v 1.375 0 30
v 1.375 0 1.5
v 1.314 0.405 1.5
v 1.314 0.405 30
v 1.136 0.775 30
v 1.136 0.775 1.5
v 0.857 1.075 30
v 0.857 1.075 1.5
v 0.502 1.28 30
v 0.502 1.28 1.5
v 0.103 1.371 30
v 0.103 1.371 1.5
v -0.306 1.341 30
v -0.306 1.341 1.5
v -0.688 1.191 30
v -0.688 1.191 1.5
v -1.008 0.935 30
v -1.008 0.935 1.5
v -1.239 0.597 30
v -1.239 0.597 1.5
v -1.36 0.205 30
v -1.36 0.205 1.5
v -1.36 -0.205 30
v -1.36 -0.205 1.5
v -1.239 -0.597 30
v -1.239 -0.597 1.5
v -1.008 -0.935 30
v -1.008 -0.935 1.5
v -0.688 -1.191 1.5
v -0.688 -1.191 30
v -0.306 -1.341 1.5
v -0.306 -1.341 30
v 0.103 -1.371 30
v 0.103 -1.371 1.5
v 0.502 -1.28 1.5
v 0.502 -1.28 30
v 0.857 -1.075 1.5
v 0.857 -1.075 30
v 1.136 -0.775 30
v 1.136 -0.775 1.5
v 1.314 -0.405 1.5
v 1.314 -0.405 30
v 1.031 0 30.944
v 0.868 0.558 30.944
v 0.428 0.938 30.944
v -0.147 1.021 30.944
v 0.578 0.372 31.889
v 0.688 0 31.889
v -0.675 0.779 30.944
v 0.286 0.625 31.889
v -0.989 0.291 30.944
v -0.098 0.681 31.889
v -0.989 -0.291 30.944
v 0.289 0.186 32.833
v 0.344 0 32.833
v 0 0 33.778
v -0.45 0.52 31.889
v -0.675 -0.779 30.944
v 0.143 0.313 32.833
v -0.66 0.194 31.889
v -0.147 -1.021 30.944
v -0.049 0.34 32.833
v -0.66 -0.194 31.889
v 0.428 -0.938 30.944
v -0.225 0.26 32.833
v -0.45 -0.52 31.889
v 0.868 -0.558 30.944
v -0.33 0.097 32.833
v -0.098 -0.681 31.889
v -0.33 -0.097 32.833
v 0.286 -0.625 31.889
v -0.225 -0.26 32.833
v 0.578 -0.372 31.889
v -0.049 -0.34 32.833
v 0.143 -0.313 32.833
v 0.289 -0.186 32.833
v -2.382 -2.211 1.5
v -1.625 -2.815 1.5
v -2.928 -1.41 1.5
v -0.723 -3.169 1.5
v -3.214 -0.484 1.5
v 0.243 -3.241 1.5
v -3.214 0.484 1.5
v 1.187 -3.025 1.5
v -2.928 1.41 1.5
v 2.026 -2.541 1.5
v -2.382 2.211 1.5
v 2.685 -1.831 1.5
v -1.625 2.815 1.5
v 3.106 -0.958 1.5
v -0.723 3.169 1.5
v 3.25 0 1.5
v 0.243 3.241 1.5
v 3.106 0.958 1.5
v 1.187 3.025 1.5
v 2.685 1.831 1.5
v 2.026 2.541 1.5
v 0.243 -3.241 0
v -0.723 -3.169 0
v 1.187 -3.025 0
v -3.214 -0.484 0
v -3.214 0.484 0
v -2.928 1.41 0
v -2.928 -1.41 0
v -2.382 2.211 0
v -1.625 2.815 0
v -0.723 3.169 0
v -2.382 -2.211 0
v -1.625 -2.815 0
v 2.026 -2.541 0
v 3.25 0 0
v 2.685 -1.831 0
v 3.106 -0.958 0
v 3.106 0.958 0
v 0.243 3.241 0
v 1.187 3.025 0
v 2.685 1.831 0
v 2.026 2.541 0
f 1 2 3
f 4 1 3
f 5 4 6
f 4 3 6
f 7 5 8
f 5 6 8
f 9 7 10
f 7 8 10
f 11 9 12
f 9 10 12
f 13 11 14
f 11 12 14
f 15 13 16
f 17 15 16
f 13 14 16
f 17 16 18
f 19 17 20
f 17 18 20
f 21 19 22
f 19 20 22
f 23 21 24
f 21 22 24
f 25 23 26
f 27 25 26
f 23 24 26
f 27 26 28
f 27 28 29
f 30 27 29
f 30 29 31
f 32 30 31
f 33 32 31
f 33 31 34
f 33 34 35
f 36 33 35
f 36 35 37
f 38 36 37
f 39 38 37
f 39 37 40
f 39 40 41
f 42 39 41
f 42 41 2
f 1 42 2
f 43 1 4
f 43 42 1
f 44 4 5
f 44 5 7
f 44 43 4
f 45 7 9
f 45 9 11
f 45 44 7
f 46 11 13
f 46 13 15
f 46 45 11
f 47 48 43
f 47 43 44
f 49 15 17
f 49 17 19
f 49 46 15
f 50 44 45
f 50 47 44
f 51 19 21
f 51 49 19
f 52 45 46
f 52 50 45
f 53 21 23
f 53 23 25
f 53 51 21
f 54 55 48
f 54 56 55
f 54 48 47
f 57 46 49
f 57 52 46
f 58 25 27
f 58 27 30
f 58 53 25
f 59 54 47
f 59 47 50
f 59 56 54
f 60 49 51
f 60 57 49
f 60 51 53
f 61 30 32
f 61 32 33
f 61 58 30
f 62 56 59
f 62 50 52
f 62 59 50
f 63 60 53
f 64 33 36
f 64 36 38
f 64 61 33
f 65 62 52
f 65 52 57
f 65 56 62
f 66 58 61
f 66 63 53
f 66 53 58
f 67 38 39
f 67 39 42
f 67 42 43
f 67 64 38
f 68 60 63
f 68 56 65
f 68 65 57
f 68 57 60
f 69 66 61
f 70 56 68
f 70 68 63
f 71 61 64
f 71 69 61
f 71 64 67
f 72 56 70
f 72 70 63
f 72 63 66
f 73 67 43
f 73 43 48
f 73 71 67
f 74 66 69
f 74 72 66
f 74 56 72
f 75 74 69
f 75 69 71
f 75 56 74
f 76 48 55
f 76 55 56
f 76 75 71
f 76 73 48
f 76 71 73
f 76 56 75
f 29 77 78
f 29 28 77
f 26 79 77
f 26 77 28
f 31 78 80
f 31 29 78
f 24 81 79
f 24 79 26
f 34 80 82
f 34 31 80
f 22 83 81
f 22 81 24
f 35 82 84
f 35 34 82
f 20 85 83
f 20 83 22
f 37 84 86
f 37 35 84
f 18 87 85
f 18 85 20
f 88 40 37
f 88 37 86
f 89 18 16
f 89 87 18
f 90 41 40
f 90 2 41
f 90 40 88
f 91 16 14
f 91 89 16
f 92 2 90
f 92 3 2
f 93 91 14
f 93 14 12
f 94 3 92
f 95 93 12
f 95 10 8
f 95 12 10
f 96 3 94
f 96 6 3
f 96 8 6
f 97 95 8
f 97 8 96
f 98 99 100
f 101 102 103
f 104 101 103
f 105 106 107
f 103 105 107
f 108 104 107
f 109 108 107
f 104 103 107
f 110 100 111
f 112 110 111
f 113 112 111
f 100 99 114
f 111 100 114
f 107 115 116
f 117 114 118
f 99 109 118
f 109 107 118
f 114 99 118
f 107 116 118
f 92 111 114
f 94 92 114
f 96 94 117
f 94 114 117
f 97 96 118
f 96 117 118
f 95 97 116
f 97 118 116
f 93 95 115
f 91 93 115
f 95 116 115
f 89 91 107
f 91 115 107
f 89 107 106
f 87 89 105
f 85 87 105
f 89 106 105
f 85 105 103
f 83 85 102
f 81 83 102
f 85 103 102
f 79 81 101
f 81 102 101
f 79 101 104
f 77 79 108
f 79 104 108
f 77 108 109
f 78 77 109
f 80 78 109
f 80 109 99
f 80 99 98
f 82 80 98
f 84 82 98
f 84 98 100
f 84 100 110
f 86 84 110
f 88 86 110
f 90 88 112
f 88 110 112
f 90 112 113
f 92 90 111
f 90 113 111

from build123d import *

# Parameters (mm, degrees)
F0_R      = 3.25
F0_R_2    = 1.375
F1_DEPTH  = 1.5
F2_DEPTH  = 30
F2_FACE_R = 1.375
F3_DEPTH  = 5
F3_TAPER  = 20


with BuildPart() as f1:
    # F0 (on Top) → F1 (new body)
    with BuildSketch(Plane.XY):
        Circle(F0_R)
        Circle(F0_R_2, mode=Mode.SUBTRACT)
    extrude(amount=F1_DEPTH)

    # F0 (on Top) → F2 (join)
    with BuildSketch(Plane.XY):
        Circle(F0_R_2)
    extrude(amount=F2_DEPTH)

    # F2_face (on face) → F3 (join)
    with BuildSketch(Plane.XY.offset(30)):
        Circle(F2_FACE_R)
    extrude(amount=F3_DEPTH, taper=F3_TAPER)


solid = f1.part
